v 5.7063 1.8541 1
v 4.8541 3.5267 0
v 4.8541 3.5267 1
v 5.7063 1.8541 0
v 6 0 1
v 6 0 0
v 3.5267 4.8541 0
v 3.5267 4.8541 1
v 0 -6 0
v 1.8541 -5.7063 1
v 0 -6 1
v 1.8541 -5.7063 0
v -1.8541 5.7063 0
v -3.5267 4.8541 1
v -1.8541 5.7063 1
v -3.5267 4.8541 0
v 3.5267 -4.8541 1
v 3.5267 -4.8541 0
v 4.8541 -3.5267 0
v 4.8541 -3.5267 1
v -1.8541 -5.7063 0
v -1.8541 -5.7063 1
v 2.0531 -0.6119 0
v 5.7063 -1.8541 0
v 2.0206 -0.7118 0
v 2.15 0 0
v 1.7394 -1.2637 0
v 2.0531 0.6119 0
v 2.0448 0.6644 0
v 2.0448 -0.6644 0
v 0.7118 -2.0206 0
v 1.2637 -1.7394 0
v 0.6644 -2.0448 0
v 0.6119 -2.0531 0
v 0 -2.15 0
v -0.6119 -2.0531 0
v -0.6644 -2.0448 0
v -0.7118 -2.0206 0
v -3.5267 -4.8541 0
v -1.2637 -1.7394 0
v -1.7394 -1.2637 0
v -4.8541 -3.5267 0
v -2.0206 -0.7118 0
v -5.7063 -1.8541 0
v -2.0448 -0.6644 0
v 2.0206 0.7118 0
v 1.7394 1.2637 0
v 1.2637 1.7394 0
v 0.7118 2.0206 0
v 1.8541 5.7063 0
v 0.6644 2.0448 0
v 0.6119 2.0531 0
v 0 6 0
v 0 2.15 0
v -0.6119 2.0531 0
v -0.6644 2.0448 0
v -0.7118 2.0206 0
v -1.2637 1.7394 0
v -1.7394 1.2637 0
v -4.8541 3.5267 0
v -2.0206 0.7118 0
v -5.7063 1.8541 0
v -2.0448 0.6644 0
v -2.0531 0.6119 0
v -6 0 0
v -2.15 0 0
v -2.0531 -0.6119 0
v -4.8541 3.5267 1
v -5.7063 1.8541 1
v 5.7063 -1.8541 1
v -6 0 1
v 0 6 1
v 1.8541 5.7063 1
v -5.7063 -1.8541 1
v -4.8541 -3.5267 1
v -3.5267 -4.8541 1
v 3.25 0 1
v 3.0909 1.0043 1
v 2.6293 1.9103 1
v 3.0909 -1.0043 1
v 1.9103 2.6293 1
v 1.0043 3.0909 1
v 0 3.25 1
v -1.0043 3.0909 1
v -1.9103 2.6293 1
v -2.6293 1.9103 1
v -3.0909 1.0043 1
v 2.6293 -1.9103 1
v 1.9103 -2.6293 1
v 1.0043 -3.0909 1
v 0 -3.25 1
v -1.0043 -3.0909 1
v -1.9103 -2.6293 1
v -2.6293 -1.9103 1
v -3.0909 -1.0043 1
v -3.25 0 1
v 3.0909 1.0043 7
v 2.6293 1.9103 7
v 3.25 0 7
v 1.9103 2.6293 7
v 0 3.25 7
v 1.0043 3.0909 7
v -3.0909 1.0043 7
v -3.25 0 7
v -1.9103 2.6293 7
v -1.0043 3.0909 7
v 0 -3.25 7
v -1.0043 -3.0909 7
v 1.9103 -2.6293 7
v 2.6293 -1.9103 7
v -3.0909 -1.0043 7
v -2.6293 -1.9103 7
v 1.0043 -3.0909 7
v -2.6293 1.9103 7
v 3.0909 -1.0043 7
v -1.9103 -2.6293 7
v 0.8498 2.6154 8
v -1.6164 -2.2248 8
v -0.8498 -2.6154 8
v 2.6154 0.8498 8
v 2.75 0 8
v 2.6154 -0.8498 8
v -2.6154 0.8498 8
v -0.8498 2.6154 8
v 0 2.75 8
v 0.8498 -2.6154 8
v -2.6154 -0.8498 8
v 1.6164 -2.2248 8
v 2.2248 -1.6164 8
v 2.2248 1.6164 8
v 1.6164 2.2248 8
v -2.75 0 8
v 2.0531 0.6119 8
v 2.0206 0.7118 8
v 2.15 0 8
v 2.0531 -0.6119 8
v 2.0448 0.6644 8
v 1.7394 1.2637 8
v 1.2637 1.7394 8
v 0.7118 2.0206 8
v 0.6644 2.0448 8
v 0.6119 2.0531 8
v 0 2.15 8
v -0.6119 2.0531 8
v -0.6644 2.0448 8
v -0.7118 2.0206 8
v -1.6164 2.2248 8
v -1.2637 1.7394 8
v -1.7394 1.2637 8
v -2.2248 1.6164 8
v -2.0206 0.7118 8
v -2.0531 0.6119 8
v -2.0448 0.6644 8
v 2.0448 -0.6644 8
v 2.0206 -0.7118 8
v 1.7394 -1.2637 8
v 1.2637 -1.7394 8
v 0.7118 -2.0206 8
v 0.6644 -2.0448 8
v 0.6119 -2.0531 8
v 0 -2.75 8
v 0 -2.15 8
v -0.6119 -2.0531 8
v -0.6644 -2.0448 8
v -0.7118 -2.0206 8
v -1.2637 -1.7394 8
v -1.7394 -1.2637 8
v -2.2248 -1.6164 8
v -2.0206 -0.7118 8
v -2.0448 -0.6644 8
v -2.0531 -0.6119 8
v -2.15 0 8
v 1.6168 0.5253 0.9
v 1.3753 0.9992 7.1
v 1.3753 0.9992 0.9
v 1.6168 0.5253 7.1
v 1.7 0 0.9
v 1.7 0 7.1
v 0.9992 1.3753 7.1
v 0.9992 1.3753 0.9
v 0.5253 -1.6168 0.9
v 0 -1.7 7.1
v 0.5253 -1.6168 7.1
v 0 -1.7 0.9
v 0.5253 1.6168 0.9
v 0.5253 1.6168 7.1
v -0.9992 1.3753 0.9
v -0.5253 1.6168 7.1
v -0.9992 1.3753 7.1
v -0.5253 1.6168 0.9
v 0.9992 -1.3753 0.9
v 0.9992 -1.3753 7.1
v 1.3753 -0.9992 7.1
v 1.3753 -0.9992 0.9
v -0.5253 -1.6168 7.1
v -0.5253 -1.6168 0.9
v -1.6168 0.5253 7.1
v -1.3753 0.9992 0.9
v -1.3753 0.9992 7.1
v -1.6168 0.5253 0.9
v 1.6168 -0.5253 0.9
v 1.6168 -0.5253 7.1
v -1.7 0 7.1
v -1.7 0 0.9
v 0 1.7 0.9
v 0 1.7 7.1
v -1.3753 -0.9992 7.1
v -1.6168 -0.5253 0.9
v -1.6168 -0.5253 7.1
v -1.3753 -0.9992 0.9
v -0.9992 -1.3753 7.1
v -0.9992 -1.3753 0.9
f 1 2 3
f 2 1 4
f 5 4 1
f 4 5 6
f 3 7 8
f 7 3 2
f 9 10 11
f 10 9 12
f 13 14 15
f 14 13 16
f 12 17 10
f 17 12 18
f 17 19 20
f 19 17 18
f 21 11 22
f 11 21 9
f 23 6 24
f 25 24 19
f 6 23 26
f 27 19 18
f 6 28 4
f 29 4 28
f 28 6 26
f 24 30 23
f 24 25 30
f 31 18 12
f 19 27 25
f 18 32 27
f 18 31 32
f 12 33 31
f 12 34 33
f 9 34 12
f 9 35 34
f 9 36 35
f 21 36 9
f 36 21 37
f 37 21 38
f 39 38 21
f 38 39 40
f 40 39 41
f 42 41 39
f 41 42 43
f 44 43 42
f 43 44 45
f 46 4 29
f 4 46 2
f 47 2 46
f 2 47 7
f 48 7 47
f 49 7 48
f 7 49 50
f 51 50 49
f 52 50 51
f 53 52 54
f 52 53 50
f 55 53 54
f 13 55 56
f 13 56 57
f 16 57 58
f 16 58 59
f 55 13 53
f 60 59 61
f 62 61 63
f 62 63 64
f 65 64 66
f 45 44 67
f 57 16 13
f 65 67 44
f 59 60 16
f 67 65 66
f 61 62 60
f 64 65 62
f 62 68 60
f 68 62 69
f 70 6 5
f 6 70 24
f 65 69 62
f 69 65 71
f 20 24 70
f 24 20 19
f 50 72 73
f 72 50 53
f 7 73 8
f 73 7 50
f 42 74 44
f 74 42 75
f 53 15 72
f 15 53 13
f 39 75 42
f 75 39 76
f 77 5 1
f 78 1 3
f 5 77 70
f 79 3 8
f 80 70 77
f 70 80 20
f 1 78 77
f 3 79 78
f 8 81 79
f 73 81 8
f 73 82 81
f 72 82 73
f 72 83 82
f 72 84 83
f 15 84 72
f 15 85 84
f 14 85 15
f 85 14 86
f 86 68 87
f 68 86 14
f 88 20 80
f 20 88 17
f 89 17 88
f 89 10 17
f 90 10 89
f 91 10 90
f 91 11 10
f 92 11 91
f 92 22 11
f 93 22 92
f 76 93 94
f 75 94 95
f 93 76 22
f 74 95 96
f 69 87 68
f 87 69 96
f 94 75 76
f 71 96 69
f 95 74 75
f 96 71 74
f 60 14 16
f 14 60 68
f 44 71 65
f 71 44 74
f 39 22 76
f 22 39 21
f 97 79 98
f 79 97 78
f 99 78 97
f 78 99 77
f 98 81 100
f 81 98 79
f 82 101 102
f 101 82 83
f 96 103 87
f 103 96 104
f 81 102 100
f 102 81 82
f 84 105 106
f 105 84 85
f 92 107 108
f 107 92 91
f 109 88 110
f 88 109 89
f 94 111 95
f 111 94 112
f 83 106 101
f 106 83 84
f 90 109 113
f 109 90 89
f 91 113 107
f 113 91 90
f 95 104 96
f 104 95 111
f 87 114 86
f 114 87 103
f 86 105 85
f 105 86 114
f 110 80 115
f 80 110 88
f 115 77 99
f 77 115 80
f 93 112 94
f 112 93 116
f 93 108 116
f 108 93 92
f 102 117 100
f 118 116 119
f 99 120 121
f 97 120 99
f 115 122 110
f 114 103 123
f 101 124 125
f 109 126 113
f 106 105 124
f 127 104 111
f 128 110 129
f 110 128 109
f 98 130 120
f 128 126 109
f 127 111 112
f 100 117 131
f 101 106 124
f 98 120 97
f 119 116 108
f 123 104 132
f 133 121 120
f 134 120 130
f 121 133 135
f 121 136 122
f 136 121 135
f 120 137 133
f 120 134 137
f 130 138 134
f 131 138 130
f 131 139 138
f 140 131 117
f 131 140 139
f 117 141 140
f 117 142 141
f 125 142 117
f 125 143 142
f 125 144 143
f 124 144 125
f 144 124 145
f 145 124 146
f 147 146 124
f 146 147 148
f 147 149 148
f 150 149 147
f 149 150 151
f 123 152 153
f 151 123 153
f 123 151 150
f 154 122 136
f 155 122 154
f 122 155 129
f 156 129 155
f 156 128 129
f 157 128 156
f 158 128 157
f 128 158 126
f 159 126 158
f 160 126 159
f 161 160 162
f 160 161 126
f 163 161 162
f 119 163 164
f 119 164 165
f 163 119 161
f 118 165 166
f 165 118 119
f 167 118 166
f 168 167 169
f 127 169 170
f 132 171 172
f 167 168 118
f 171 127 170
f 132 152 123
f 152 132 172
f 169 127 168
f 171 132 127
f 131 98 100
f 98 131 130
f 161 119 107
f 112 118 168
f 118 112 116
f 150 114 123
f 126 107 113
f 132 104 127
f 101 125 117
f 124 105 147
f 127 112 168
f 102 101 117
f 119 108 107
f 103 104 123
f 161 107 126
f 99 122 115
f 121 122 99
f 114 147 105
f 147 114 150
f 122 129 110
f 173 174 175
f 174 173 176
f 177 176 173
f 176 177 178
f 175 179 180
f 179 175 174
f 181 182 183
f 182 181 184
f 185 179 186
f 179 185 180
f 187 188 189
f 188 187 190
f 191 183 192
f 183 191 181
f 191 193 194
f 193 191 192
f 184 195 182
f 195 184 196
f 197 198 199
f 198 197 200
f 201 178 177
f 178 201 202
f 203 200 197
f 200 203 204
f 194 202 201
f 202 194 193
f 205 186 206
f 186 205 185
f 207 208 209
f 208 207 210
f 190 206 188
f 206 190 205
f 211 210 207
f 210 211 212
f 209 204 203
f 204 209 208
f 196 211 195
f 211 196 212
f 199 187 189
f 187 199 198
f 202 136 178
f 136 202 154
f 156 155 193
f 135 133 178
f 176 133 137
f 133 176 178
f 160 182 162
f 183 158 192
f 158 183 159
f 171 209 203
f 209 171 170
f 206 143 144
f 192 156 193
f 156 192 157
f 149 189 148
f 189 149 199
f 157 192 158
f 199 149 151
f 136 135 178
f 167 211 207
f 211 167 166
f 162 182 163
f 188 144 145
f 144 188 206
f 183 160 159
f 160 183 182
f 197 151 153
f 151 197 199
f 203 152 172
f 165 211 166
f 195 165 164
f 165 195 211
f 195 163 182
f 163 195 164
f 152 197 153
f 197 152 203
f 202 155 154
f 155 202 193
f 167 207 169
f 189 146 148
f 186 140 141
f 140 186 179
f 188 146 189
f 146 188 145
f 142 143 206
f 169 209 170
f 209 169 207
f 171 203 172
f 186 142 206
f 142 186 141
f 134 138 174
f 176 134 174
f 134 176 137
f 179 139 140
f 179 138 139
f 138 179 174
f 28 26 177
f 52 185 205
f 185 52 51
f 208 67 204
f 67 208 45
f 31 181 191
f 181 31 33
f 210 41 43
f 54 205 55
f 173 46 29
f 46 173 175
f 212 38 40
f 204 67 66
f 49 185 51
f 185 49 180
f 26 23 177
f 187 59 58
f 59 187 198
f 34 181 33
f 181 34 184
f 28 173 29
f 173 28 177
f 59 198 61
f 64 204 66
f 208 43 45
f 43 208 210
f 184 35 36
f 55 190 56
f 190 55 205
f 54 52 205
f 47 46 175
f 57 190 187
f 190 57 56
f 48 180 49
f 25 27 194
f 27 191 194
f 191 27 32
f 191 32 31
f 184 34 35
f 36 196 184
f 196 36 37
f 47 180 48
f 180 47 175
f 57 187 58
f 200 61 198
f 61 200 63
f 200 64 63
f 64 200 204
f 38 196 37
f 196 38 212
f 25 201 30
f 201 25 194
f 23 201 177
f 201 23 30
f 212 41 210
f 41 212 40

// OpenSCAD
// [FL_INDEX: keywords="openscad, 3d_parametric, Customizable_Spring_Footings_for_Replicator_2_2X_Build_Plate, csg_solid" | COT="Parametric OpenSCAD design from 3DCodeverse"]
// Title: Customizable Spring Footings for Replicator 2/2X Build Plate

// Build Plate Footing

/* [Dimensions] */

// the footing base height
base_height = 1;

// the footing base diameter
base_diameter = 12;

// the height of the footing inner
inner_height = 8;

// the diameter of the footing inner
inner_diameter = 6.5;

// the diameter of the footing hole
hole_diameter = 3.4;

/* [hidden] */
$fn = 20;

difference() {
 union() {
  cylinder(h=base_height, r=base_diameter/2);
  cylinder(h=inner_height-1, r=inner_diameter/2);
  translate([0,0,inner_height - 1]) cylinder(h=1, r1=inner_diameter/2, r2=inner_diameter/2-.5);
 }
 translate([0,0,-1]) cylinder(h=inner_height+2, r=hole_diameter/2);
 translate([0,0,inner_height-0.9]) cylinder(h=1, r1=hole_diameter/2, r2=hole_diameter/2+.5);
 translate([0,0,-0.1]) cylinder(h=1, r1=hole_diameter/2+0.5, r2=hole_diameter/2);
}
